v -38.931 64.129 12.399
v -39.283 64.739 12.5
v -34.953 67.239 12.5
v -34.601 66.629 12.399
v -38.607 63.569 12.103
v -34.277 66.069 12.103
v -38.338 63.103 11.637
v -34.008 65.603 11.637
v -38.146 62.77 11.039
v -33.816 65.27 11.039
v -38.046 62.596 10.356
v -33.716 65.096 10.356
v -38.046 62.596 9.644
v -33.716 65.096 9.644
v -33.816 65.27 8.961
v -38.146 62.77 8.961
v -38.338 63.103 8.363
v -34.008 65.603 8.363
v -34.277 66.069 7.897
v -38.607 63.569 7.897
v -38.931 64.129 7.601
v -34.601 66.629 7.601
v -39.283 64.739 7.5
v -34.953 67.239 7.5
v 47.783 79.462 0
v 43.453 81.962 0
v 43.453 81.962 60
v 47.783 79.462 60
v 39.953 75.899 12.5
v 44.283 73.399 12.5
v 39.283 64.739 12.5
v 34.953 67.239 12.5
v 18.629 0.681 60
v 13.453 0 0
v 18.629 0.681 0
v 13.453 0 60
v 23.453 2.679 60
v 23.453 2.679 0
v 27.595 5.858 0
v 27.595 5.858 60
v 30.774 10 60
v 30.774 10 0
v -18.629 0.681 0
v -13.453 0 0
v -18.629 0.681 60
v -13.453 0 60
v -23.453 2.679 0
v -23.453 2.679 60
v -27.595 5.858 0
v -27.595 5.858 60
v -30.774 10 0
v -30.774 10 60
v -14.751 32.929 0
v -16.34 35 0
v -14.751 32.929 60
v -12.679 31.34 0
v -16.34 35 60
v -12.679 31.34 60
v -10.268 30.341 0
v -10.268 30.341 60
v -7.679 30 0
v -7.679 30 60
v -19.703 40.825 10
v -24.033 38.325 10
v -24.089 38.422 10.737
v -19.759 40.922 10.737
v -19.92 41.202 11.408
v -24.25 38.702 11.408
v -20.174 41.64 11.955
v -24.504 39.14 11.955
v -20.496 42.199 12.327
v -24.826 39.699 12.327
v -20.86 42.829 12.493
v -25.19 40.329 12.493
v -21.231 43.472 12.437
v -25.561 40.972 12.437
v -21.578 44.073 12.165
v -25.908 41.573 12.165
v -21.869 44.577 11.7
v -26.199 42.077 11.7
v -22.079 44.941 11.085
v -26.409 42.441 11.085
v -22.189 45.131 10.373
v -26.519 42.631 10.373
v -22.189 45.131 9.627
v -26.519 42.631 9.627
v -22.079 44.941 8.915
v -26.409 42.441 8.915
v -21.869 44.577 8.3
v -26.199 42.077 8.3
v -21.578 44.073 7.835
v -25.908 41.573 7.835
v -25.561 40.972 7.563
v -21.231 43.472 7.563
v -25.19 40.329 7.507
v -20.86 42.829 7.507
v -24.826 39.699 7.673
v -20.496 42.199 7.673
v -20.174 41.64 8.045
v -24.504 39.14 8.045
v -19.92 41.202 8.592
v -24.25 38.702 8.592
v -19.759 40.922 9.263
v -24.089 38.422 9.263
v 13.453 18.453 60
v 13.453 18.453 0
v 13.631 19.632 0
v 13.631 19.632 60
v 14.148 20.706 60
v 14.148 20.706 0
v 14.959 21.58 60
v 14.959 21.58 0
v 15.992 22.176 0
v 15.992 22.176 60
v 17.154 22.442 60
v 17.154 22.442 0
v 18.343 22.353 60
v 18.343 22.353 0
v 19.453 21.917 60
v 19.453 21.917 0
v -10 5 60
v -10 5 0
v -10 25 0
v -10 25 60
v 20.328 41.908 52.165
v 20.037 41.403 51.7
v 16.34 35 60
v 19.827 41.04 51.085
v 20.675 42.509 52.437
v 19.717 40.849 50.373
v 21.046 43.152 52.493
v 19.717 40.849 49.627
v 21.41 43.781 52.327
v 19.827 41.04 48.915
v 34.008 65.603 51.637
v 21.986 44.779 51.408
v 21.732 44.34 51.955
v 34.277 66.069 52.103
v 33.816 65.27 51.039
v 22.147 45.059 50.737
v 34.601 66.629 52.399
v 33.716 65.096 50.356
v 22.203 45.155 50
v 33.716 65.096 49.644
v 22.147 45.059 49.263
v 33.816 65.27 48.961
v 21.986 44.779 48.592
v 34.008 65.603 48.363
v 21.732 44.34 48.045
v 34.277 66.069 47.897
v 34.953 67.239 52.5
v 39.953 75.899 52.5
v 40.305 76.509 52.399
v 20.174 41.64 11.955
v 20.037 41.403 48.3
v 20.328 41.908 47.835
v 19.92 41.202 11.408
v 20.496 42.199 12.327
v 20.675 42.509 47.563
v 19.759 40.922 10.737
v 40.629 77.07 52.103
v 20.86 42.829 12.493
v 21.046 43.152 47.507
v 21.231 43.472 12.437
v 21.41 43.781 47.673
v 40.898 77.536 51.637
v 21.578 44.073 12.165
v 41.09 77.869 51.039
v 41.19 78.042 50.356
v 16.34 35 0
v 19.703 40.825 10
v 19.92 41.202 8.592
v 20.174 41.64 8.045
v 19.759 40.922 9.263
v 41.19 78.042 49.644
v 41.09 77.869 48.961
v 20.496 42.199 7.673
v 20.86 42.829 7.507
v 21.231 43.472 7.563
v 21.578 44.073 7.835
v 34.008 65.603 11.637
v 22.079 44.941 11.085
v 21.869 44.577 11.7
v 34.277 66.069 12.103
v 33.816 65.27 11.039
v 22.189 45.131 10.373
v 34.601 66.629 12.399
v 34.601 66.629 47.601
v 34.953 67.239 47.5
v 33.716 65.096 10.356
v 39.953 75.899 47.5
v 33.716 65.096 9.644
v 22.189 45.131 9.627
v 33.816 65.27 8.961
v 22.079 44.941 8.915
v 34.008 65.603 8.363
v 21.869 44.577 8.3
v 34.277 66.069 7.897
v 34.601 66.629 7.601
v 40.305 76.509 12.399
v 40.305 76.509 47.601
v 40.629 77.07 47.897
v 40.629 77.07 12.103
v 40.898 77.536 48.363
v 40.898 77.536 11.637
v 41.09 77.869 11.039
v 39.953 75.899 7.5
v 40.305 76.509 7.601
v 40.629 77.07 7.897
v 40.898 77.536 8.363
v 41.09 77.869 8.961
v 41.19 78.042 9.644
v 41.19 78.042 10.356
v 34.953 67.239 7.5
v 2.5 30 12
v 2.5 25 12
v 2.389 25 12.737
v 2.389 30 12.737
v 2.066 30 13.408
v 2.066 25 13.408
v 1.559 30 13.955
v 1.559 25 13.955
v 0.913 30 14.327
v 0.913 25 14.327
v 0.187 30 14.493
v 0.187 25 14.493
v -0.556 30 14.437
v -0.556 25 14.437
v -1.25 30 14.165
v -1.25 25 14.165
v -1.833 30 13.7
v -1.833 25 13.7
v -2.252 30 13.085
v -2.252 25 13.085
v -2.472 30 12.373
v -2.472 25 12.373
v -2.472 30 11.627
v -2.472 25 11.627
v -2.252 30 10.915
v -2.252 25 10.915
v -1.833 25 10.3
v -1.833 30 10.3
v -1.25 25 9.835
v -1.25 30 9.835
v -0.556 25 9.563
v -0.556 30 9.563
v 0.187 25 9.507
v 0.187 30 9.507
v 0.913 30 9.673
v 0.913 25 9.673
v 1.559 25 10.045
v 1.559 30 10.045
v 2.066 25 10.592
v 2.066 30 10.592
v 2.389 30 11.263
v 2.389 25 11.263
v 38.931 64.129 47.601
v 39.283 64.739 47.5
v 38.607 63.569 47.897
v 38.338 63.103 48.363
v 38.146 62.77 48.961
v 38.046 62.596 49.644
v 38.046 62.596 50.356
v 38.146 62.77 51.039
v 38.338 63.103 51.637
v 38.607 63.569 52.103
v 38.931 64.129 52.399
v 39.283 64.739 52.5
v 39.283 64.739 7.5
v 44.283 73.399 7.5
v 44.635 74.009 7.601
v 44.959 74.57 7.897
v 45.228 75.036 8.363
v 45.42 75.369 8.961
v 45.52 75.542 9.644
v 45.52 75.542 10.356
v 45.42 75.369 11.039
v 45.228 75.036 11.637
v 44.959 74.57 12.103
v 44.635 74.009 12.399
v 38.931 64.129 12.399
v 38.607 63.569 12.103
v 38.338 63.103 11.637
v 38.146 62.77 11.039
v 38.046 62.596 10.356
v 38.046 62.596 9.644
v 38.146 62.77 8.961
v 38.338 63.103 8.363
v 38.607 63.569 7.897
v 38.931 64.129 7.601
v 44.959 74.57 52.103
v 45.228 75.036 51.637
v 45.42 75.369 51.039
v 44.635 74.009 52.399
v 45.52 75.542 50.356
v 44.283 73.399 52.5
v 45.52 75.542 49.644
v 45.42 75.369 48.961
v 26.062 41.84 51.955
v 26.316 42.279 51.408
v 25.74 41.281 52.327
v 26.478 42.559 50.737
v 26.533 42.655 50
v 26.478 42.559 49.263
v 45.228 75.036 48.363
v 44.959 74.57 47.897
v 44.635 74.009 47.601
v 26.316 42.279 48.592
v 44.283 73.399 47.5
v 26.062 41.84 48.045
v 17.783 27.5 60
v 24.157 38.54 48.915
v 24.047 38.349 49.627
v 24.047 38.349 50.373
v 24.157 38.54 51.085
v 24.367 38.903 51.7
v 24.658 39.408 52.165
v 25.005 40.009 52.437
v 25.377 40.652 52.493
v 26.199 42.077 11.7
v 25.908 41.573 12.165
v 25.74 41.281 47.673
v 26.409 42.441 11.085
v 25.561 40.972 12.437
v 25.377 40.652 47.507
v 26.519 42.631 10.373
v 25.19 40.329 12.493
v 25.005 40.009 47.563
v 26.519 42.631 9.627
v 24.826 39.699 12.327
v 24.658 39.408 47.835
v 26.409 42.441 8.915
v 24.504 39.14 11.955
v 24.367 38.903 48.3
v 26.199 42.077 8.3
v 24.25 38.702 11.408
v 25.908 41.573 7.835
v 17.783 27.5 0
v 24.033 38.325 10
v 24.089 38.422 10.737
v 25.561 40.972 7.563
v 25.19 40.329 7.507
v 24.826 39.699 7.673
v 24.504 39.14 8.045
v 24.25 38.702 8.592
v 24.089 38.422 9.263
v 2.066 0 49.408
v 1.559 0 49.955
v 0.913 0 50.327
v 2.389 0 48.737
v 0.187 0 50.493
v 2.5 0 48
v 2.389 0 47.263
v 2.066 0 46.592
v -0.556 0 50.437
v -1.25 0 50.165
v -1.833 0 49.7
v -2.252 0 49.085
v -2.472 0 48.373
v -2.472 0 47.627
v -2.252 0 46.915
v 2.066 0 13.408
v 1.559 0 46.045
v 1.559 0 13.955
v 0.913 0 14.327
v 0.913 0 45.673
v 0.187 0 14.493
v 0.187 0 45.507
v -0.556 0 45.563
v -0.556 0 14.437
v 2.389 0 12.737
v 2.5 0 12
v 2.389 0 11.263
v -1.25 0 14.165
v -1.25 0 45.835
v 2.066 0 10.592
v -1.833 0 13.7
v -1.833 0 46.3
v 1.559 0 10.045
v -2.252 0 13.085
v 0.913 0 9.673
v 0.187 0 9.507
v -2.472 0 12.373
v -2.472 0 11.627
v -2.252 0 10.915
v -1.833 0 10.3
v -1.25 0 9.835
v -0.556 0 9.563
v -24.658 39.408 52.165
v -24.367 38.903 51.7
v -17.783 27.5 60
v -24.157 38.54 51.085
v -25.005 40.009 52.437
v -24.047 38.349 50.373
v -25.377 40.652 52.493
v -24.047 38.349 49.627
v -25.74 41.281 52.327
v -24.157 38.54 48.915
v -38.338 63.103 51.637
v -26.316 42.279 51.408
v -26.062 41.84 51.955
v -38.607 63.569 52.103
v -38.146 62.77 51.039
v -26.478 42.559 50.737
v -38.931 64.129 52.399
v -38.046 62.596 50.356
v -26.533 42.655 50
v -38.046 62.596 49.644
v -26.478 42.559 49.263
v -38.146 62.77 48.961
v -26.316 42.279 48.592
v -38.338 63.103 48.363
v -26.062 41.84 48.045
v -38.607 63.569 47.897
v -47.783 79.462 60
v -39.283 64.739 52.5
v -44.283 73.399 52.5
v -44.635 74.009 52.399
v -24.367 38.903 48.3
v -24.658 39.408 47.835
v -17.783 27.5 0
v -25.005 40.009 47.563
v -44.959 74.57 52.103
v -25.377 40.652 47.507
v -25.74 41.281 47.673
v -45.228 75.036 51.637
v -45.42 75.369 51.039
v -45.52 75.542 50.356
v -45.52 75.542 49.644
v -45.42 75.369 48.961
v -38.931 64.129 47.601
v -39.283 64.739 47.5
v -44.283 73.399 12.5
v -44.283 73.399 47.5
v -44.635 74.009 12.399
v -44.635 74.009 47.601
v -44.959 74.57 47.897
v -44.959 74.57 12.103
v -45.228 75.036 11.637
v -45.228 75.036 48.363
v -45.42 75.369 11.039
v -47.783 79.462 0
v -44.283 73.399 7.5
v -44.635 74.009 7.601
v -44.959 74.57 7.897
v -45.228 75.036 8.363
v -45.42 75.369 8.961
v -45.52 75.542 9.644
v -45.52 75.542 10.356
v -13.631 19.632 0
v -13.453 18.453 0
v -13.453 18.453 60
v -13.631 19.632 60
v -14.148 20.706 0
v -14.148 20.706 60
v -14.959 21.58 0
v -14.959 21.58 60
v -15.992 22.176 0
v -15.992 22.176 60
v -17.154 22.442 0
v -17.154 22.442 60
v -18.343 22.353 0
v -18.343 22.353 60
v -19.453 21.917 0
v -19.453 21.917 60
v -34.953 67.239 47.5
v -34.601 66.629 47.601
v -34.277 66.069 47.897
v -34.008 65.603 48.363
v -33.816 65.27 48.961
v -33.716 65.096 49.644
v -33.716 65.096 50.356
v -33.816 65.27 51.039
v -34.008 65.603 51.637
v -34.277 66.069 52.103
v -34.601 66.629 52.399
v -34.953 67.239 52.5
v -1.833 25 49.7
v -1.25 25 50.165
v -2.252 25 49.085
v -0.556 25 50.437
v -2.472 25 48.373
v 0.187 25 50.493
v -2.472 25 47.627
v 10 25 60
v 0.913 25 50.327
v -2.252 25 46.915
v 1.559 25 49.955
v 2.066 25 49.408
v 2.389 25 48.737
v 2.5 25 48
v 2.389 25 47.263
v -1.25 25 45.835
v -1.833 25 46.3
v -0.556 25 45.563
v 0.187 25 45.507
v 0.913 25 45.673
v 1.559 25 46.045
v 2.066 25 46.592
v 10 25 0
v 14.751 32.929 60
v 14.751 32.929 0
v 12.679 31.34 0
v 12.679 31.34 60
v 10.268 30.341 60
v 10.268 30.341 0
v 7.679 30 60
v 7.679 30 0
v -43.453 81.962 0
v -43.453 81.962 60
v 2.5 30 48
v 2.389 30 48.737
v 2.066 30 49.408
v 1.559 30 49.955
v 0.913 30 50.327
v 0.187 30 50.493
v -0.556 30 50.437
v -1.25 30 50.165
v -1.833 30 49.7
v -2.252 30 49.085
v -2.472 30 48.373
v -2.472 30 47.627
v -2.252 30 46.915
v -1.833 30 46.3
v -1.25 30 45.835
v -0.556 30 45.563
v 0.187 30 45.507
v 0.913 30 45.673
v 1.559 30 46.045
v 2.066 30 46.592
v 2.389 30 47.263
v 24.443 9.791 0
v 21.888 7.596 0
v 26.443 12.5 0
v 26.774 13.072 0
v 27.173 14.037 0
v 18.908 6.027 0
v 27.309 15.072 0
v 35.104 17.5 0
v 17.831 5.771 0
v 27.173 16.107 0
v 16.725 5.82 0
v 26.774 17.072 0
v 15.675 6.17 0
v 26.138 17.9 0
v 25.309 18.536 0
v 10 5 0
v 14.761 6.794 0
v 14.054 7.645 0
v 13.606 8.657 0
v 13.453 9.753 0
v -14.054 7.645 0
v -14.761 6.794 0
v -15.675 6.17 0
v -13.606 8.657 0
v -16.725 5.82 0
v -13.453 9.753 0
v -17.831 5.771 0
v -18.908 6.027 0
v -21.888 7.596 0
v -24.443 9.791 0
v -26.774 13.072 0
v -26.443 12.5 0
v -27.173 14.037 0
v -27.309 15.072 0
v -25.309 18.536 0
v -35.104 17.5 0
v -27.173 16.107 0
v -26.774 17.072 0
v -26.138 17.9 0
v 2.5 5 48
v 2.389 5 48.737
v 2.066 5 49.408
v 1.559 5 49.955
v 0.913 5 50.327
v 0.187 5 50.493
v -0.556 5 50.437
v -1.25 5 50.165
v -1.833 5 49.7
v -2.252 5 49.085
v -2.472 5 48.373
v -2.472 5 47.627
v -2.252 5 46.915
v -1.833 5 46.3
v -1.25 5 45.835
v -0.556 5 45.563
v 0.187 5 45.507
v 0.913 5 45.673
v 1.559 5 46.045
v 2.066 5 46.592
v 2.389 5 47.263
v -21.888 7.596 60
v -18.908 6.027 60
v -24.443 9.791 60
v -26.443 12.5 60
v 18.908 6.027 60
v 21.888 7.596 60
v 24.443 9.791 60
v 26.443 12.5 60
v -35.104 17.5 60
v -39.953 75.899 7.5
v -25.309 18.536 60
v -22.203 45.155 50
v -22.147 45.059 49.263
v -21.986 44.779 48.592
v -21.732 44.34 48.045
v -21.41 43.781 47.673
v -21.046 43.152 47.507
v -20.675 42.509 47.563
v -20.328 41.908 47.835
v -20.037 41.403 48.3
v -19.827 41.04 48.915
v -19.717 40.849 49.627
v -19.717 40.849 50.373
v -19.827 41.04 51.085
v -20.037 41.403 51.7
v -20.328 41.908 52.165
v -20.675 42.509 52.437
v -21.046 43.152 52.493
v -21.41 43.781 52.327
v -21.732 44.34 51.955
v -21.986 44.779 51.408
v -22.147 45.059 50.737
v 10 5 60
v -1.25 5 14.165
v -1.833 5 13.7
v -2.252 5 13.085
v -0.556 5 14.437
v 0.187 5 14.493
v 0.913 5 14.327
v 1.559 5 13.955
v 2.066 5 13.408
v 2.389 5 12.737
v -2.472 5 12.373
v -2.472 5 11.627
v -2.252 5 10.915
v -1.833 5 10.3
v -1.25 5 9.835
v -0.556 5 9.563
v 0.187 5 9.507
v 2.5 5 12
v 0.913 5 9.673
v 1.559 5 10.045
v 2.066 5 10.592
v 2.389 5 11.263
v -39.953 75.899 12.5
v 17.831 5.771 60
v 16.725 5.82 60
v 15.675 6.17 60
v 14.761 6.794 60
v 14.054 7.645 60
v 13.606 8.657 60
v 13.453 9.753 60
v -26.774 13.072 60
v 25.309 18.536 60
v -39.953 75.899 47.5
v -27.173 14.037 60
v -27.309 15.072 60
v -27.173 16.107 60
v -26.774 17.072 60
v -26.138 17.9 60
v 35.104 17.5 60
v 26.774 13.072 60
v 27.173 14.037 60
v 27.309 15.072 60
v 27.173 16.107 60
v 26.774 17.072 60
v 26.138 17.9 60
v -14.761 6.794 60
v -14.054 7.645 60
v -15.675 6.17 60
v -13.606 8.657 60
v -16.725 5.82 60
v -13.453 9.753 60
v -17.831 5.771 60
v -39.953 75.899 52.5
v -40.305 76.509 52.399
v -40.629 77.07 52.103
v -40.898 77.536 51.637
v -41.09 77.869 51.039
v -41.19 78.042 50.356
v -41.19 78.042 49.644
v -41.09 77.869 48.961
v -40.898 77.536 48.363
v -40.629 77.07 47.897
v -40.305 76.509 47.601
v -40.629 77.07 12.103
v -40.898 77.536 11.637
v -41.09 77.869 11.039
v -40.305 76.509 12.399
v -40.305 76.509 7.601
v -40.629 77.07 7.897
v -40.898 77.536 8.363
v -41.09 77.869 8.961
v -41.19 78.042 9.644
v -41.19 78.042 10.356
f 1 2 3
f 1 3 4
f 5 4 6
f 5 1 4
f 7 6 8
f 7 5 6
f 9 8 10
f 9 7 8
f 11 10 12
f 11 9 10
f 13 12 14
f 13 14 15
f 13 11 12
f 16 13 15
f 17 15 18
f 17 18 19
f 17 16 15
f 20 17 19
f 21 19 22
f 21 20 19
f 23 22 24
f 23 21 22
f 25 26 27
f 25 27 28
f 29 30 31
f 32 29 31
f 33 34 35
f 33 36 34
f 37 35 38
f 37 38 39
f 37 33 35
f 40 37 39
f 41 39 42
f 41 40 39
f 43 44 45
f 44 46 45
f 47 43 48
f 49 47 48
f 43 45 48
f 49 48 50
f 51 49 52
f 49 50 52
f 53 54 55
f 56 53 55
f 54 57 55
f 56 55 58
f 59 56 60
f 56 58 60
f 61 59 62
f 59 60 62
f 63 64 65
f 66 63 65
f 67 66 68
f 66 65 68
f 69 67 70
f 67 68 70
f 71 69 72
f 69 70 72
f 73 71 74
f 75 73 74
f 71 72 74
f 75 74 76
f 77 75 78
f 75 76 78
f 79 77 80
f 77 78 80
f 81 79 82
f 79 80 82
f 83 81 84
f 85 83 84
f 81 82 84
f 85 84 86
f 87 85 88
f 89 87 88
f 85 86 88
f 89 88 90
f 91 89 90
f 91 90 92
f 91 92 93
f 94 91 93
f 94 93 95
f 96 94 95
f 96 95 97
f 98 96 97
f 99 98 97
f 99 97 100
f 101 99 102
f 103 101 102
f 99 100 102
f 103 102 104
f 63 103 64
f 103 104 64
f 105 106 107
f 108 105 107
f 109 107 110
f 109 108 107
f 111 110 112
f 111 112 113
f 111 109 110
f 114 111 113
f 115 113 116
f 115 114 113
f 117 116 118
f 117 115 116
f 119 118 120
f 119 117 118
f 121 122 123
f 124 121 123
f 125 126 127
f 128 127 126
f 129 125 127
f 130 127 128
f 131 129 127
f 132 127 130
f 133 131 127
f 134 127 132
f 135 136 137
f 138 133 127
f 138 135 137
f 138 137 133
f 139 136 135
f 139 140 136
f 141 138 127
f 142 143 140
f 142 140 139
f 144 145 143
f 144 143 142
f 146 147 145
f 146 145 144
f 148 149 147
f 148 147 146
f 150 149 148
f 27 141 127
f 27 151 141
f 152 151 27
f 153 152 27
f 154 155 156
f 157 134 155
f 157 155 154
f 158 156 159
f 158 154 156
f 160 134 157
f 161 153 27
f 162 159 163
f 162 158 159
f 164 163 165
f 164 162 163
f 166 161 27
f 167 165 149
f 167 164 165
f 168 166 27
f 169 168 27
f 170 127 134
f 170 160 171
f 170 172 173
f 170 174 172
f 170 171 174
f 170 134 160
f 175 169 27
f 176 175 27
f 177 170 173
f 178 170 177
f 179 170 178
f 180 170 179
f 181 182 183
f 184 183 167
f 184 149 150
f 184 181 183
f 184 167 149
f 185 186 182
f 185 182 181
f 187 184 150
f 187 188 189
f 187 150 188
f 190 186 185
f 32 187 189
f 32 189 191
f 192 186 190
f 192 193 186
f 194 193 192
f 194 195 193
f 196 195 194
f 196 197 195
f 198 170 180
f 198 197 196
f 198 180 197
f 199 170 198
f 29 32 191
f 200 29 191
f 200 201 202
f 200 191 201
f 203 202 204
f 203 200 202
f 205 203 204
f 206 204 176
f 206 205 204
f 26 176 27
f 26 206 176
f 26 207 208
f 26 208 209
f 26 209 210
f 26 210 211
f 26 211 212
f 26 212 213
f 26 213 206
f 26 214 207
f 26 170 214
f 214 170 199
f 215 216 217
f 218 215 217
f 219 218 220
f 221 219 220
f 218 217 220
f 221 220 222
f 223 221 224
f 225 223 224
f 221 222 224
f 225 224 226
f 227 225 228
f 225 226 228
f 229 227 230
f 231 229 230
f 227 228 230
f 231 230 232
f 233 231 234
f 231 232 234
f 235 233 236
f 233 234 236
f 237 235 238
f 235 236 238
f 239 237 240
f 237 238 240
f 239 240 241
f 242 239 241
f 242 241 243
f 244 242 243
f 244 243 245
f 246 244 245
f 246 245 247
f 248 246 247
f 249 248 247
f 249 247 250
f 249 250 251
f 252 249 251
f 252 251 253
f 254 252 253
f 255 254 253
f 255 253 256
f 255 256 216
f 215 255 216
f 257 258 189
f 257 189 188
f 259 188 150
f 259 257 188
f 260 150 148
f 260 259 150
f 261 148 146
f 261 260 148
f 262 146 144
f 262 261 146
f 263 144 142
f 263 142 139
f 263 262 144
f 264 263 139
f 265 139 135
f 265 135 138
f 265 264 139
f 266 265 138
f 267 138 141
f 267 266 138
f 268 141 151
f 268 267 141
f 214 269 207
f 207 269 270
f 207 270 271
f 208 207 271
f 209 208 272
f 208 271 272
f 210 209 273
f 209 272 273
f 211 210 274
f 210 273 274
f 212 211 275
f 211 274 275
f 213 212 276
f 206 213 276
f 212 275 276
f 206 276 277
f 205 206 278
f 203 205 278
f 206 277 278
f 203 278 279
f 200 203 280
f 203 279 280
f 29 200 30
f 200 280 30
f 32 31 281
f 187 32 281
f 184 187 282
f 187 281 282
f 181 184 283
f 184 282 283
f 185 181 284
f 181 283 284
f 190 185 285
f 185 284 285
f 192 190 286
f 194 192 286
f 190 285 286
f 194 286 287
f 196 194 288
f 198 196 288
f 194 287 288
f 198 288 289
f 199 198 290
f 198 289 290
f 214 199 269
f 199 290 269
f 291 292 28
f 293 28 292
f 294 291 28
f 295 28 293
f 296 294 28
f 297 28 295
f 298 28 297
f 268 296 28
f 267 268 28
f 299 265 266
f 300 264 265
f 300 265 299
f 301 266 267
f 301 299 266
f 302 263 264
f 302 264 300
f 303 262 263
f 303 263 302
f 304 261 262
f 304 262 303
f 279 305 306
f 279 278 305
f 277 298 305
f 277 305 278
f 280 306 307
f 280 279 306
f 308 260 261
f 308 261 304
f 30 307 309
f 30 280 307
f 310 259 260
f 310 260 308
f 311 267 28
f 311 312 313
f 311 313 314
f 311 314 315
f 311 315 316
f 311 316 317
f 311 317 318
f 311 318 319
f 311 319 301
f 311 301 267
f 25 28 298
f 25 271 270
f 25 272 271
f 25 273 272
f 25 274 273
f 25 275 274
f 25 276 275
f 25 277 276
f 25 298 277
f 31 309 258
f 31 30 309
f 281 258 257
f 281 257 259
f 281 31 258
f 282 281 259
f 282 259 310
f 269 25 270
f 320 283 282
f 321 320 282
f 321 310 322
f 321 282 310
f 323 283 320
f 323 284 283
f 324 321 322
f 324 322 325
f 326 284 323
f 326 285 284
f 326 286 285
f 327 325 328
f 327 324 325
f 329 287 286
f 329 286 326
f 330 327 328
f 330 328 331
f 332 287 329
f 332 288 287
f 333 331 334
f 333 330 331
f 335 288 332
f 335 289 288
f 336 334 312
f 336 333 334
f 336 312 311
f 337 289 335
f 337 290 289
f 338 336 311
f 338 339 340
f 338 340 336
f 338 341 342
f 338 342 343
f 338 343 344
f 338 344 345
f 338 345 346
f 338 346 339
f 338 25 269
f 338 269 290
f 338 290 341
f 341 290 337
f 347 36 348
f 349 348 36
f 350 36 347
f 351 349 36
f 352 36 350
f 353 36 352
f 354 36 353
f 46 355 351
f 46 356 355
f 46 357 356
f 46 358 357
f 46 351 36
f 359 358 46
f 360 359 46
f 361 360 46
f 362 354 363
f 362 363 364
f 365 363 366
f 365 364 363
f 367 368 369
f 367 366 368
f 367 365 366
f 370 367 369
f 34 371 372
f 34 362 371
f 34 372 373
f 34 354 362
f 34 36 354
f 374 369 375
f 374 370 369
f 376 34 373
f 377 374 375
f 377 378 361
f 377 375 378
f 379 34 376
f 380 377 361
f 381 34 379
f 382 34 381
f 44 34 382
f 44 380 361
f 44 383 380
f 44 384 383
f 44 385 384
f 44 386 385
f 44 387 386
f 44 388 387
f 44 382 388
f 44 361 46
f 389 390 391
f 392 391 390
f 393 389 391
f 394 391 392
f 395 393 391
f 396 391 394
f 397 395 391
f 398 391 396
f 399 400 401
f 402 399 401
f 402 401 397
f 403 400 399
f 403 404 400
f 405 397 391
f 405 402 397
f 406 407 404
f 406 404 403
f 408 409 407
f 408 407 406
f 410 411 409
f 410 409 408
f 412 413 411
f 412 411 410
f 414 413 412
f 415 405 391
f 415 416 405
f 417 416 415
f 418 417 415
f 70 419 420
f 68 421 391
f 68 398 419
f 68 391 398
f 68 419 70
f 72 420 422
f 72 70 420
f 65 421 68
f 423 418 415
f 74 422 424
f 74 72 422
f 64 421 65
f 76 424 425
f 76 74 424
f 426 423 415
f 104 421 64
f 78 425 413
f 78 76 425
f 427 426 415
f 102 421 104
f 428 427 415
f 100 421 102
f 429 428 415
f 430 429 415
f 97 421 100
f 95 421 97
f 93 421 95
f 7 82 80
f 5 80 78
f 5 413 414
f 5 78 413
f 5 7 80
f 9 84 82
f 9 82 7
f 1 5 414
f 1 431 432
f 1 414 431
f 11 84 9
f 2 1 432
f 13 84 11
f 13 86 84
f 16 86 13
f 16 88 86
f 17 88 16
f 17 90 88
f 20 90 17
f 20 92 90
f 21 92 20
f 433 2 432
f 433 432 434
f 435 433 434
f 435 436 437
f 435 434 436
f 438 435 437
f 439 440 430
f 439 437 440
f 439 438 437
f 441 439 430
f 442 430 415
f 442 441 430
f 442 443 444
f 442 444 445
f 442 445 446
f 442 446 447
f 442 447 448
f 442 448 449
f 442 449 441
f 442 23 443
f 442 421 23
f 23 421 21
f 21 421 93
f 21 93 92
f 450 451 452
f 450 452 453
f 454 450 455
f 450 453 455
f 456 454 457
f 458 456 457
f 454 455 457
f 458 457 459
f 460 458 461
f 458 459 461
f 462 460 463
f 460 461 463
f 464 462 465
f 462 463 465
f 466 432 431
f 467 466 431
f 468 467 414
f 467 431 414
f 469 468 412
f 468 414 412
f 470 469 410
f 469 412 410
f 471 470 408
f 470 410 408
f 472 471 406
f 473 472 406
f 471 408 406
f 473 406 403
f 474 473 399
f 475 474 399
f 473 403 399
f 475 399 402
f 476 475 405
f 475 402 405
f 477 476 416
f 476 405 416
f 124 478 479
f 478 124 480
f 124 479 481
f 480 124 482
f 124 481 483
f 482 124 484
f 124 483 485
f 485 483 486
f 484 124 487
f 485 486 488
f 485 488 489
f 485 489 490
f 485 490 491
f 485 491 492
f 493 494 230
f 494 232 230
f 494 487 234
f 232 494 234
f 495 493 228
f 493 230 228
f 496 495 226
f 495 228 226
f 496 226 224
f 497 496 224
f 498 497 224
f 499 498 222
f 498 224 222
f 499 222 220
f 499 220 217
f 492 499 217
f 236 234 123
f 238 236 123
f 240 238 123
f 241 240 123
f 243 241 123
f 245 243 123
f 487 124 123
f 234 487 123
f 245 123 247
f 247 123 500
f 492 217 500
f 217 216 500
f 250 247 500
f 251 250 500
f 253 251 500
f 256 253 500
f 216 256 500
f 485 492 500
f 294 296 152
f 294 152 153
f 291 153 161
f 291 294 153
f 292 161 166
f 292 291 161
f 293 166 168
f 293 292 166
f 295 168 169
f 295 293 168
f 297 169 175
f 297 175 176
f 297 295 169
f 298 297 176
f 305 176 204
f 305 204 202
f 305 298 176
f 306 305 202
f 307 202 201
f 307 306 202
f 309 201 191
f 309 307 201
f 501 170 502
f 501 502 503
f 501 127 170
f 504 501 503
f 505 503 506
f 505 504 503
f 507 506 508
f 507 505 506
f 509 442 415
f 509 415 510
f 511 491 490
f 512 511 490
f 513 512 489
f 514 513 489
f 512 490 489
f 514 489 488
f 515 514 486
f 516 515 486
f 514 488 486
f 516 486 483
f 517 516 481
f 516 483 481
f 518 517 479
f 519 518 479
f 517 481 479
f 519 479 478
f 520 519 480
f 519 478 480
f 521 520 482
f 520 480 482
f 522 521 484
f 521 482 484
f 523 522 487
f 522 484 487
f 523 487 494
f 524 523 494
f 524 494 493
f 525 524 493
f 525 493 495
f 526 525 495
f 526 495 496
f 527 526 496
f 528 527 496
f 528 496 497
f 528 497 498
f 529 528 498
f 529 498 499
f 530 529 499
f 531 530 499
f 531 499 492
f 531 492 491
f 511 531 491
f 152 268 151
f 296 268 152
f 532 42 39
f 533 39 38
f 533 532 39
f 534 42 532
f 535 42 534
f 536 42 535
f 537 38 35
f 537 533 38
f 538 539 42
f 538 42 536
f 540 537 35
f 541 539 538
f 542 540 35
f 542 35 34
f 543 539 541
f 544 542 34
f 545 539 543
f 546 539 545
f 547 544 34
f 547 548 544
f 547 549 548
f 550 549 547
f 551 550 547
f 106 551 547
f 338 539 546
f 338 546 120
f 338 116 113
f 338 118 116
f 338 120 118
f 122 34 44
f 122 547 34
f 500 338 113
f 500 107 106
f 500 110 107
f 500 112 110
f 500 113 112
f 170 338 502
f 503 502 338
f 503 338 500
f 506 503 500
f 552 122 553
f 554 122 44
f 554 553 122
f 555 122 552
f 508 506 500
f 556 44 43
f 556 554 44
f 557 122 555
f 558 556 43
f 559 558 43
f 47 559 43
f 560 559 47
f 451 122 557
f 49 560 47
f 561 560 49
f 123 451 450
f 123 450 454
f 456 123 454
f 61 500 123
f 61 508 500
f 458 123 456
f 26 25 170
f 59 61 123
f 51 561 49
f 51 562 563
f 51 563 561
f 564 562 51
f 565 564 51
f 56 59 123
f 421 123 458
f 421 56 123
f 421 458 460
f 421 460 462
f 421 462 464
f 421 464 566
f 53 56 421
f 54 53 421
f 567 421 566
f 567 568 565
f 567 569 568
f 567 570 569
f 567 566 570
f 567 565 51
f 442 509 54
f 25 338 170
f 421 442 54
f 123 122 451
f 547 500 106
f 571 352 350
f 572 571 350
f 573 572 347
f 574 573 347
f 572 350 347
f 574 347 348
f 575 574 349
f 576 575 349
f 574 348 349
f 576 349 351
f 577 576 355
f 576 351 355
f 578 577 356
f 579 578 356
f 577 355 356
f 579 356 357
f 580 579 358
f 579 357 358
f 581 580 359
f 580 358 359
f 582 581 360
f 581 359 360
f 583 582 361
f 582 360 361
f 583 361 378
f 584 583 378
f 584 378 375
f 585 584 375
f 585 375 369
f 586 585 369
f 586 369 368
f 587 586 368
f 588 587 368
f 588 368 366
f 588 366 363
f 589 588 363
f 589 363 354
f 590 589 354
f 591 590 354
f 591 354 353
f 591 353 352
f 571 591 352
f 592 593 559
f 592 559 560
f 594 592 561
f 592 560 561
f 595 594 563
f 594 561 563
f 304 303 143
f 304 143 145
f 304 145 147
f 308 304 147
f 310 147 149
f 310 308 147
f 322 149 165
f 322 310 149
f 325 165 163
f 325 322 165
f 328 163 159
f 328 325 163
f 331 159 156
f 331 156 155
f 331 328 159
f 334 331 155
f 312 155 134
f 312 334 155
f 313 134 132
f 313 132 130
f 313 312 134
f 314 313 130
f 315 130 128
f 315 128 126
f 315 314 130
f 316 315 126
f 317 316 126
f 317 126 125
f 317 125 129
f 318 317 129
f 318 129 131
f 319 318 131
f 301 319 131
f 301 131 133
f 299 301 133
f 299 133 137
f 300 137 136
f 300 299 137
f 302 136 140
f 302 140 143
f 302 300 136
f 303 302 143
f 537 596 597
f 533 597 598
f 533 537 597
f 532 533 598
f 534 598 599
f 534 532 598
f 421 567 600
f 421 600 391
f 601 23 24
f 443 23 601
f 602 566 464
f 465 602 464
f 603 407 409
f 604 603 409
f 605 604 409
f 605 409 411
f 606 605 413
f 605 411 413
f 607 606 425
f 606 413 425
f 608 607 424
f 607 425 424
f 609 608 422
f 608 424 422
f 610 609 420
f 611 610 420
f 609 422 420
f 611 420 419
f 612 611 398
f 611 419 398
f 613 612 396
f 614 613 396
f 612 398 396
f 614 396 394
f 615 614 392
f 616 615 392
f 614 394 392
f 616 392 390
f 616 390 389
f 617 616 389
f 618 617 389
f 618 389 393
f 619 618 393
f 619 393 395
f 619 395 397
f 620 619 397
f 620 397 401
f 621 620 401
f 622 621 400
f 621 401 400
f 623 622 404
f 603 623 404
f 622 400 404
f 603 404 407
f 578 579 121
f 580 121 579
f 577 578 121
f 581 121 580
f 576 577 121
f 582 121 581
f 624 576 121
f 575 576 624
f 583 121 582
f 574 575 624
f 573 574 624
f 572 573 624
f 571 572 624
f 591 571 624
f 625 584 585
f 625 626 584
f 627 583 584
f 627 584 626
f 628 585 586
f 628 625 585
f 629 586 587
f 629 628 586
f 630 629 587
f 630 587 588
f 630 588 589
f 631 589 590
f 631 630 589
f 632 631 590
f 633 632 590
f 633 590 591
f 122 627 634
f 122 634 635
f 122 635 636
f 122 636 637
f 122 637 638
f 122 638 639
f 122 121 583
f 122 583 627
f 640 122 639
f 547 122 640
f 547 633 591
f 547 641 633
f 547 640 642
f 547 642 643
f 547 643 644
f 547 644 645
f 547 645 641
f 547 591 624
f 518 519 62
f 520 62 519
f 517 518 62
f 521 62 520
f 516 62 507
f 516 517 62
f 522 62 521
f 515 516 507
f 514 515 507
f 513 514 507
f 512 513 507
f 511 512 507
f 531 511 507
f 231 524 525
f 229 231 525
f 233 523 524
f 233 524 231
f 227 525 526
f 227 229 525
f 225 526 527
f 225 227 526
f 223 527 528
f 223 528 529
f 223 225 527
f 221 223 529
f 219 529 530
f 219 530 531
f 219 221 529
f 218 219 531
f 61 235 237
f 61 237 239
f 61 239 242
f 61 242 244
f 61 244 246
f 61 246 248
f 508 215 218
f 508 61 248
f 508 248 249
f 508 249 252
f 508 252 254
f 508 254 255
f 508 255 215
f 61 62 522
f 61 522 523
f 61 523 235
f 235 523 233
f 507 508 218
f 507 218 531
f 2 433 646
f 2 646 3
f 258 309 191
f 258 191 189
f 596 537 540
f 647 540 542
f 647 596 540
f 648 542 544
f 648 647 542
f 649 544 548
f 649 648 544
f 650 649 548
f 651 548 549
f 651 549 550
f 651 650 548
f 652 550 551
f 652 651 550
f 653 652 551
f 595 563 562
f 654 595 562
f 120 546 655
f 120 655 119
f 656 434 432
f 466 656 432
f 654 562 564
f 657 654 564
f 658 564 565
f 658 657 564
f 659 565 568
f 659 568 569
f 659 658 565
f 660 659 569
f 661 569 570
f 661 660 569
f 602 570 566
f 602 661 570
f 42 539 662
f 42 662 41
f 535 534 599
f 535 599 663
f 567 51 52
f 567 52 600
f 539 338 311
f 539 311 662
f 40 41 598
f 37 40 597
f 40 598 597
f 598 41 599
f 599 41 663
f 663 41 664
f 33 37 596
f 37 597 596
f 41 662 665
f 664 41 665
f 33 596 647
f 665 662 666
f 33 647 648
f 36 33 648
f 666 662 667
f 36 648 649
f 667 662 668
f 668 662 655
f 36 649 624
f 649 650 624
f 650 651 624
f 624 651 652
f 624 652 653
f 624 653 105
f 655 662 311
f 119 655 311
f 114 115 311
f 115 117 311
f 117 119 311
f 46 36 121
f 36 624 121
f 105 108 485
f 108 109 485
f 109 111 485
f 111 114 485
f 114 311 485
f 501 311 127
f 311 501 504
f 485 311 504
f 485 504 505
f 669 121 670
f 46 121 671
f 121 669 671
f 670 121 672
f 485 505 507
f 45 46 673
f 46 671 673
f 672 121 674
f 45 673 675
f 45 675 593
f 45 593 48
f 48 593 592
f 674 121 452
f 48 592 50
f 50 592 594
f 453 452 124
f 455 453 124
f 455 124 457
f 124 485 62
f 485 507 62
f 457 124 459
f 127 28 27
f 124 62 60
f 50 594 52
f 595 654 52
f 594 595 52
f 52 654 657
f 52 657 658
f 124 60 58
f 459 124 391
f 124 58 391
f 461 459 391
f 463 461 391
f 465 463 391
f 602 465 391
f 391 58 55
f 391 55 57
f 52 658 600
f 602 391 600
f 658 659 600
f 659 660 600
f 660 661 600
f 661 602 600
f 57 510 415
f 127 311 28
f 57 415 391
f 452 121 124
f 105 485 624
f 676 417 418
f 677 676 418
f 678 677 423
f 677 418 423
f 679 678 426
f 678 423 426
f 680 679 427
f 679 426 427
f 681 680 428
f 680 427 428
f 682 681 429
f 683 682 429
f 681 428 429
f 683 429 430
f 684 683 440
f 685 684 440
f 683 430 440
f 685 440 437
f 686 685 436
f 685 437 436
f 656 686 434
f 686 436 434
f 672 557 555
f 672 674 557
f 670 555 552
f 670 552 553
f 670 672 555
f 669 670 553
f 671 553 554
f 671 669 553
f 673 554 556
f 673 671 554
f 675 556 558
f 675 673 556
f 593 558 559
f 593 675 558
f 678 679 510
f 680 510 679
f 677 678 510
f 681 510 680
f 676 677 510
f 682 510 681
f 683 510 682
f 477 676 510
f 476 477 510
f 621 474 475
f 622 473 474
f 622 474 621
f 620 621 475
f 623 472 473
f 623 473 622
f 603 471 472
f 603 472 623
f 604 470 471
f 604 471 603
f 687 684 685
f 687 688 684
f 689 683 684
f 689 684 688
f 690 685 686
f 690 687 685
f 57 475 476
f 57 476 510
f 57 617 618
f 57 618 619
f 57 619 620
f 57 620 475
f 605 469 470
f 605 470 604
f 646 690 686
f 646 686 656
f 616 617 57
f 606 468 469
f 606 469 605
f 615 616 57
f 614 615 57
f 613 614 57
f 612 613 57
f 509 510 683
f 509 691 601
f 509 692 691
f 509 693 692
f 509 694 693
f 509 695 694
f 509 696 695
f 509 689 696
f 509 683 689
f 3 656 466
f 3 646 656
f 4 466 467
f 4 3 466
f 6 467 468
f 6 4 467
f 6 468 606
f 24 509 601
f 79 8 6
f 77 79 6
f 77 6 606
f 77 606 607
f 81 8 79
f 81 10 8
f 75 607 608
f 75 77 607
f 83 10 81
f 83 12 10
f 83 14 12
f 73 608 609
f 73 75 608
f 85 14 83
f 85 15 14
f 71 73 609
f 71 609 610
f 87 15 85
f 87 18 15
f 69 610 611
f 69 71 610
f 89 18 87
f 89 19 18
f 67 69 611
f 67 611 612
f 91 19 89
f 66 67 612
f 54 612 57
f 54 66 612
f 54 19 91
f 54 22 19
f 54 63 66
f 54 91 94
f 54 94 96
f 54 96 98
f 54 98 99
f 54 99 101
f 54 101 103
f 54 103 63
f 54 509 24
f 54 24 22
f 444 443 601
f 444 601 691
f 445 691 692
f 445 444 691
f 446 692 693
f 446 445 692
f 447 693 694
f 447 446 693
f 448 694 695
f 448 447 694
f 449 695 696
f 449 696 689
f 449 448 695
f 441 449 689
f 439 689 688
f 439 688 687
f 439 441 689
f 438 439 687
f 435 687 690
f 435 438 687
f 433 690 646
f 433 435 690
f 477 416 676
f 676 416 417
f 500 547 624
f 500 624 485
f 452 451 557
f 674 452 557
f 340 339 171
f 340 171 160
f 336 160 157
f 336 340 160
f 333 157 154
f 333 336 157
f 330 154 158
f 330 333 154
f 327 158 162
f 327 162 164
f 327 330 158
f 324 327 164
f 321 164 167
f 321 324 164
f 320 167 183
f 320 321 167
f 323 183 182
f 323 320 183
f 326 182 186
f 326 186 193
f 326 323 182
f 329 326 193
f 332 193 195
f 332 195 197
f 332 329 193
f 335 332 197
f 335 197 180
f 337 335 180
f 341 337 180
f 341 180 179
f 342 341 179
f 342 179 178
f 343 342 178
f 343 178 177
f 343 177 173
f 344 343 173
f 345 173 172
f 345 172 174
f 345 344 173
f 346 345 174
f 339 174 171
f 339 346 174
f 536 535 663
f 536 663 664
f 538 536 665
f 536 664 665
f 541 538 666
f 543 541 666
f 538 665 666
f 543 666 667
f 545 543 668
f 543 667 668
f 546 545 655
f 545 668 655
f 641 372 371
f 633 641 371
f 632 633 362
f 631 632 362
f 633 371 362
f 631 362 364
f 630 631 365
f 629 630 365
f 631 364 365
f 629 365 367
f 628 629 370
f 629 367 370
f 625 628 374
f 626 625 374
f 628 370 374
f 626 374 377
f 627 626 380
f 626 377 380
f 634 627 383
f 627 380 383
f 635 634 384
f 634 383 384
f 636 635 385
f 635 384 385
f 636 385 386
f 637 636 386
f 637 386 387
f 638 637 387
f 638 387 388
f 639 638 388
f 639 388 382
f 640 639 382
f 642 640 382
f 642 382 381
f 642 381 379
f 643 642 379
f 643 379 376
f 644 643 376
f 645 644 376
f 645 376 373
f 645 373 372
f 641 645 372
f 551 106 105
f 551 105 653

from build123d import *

# Parameters (mm, degrees)
SCHIZZO1_W                   = 20
SCHIZZO1_H                   = 20
ESTRUSIONE_ESTRUSIONE1_DEPTH = 60
RACCORDO1_R                  = 20
SCHIZZO8_R                   = 2.5
TAGLIO_ESTRUSIONE3_DEPTH     = 5
TAGLIO_ESTRUSIONE4_DEPTH     = 113.253811369
RACCORDO2_R                  = 10
RACCORDO3_R                  = 4
SCHIZZO11_R                  = 2.5
TAGLIO_ESTRUSIONE5_DEPTH     = 113.253811369


with BuildPart() as part:
    # Schizzo1 → Estrusione-Estrusione1 (new body)
    with BuildSketch(Plane.XY):
        Polygon((25, 0), (-25, 0), (-35.103629711, 17.5), (-17.783121635, 27.5), (-47.783121635, 79.461524227), (-43.452994616, 81.961524227), (-13.452994616, 30), (13.452994616, 30), (43.452994616, 81.961524227), (47.783121635, 79.461524227), (17.783121635, 27.5), (35.103629711, 17.5), align=None)
        with Locations((0, 15)):
            Rectangle(SCHIZZO1_W, SCHIZZO1_H, mode=Mode.SUBTRACT)
    extrude(amount=ESTRUSIONE_ESTRUSIONE1_DEPTH)

    # Raccordo1
    raccordo1_edges = [part.edges().sort_by_distance(p)[0] for p in [
        (25, 0, 30),
        (-25, 0, 30),
    ]]
    fillet(raccordo1_edges, radius=RACCORDO1_R)

    # Schizzo8 → Taglio-Estrusione3 (cut)
    with BuildSketch(Plane(origin=(-1.429491924, -0.825317547, 0), x_dir=(0, 0, 1), z_dir=(-0.8660254037844398, -0.49999999999999806, 0))):
        with Locations(Location((10, 47.707259422, 0), (0, 0, 270))):
            Circle(SCHIZZO8_R)
        with Locations(Location((50, 47.707259422, 0), (0, 0, 90))):
            Circle(SCHIZZO8_R)
        with BuildLine():
            Line((12.5, 85.707259422), (12.5, 75.707259422))
            ThreePointArc((12.5, 75.707259422), (10, 73.207259422), (7.5, 75.707259422))
            Line((7.5, 75.707259422), (7.5, 85.707259422))
            ThreePointArc((7.5, 85.707259422), (10, 88.207259422), (12.5, 85.707259422))
        make_face()
        with BuildLine():
            Line((47.5, 85.707259422), (47.5, 75.707259422))
            ThreePointArc((47.5, 75.707259422), (50, 73.207259422), (52.5, 75.707259422))
            Line((52.5, 75.707259422), (52.5, 85.707259422))
            ThreePointArc((52.5, 85.707259422), (50, 88.207259422), (47.5, 85.707259422))
        make_face()
    taglio_estrusione3 = extrude(amount=-TAGLIO_ESTRUSIONE3_DEPTH, mode=Mode.SUBTRACT)

    # Specchia1: Taglio-Estrusione3 across plane
    add(taglio_estrusione3.mirror(Plane(origin=(0, 0, 0), x_dir=(0, 0, 1), z_dir=(1, 0, 0))), mode=Mode.SUBTRACT)

    # Schizzo10 → Taglio-Estrusione4 (cut, through all)
    with BuildSketch(Plane(origin=(0, 0, 0), x_dir=(-1, 0, 0), z_dir=(0, 0, -1))):
        with BuildLine():
            Line((-28.773502692, 16.535898385), (-13.452994616, 25.381197846))
            Line((-13.452994616, 25.381197846), (-13.452994616, 5))
            ThreePointArc((-13.452994616, 5), (-20.952994616, 7.009618943), (-26.443375673, 12.5))
            Line((-26.443375673, 12.5), (-28.773502692, 16.535898385))
        make_face()
        with BuildLine():
            Line((13.452994616, 25.381197846), (13.452994616, 5))
            ThreePointArc((13.452994616, 5), (20.952994616, 7.009618943), (26.443375673, 12.5))
            Line((26.443375673, 12.5), (28.773502692, 16.535898385))
            Line((28.773502692, 16.535898385), (13.452994616, 25.381197846))
        make_face()
    extrude(amount=-TAGLIO_ESTRUSIONE4_DEPTH, mode=Mode.SUBTRACT)

    # Raccordo2
    raccordo2_edges = [part.edges().sort_by_distance(p)[0] for p in [
        (-13.452994616, 30, 30),
        (13.452994616, 30, 30),
    ]]
    fillet(raccordo2_edges, radius=RACCORDO2_R)

    # Raccordo3
    raccordo3_edges = [part.edges().sort_by_distance(p)[0] for p in [
        (28.773502692, 16.535898385, 30),
        (13.452994616, 25.381197846, 30),
        (13.452994616, 5, 30),
        (-13.452994616, 5, 30),
        (-13.452994616, 25.381197846, 30),
        (-28.773502692, 16.535898385, 30),
    ]]
    fillet(raccordo3_edges, radius=RACCORDO3_R)

    # Schizzo11 → Taglio-Estrusione5 (cut, through all)
    with BuildSketch(Plane.XZ):
        with Locations((0, 48)):
            Circle(SCHIZZO11_R)
        with Locations((0, 12)):
            Circle(SCHIZZO11_R)
    extrude(amount=-TAGLIO_ESTRUSIONE5_DEPTH, mode=Mode.SUBTRACT)


solid = part.part
